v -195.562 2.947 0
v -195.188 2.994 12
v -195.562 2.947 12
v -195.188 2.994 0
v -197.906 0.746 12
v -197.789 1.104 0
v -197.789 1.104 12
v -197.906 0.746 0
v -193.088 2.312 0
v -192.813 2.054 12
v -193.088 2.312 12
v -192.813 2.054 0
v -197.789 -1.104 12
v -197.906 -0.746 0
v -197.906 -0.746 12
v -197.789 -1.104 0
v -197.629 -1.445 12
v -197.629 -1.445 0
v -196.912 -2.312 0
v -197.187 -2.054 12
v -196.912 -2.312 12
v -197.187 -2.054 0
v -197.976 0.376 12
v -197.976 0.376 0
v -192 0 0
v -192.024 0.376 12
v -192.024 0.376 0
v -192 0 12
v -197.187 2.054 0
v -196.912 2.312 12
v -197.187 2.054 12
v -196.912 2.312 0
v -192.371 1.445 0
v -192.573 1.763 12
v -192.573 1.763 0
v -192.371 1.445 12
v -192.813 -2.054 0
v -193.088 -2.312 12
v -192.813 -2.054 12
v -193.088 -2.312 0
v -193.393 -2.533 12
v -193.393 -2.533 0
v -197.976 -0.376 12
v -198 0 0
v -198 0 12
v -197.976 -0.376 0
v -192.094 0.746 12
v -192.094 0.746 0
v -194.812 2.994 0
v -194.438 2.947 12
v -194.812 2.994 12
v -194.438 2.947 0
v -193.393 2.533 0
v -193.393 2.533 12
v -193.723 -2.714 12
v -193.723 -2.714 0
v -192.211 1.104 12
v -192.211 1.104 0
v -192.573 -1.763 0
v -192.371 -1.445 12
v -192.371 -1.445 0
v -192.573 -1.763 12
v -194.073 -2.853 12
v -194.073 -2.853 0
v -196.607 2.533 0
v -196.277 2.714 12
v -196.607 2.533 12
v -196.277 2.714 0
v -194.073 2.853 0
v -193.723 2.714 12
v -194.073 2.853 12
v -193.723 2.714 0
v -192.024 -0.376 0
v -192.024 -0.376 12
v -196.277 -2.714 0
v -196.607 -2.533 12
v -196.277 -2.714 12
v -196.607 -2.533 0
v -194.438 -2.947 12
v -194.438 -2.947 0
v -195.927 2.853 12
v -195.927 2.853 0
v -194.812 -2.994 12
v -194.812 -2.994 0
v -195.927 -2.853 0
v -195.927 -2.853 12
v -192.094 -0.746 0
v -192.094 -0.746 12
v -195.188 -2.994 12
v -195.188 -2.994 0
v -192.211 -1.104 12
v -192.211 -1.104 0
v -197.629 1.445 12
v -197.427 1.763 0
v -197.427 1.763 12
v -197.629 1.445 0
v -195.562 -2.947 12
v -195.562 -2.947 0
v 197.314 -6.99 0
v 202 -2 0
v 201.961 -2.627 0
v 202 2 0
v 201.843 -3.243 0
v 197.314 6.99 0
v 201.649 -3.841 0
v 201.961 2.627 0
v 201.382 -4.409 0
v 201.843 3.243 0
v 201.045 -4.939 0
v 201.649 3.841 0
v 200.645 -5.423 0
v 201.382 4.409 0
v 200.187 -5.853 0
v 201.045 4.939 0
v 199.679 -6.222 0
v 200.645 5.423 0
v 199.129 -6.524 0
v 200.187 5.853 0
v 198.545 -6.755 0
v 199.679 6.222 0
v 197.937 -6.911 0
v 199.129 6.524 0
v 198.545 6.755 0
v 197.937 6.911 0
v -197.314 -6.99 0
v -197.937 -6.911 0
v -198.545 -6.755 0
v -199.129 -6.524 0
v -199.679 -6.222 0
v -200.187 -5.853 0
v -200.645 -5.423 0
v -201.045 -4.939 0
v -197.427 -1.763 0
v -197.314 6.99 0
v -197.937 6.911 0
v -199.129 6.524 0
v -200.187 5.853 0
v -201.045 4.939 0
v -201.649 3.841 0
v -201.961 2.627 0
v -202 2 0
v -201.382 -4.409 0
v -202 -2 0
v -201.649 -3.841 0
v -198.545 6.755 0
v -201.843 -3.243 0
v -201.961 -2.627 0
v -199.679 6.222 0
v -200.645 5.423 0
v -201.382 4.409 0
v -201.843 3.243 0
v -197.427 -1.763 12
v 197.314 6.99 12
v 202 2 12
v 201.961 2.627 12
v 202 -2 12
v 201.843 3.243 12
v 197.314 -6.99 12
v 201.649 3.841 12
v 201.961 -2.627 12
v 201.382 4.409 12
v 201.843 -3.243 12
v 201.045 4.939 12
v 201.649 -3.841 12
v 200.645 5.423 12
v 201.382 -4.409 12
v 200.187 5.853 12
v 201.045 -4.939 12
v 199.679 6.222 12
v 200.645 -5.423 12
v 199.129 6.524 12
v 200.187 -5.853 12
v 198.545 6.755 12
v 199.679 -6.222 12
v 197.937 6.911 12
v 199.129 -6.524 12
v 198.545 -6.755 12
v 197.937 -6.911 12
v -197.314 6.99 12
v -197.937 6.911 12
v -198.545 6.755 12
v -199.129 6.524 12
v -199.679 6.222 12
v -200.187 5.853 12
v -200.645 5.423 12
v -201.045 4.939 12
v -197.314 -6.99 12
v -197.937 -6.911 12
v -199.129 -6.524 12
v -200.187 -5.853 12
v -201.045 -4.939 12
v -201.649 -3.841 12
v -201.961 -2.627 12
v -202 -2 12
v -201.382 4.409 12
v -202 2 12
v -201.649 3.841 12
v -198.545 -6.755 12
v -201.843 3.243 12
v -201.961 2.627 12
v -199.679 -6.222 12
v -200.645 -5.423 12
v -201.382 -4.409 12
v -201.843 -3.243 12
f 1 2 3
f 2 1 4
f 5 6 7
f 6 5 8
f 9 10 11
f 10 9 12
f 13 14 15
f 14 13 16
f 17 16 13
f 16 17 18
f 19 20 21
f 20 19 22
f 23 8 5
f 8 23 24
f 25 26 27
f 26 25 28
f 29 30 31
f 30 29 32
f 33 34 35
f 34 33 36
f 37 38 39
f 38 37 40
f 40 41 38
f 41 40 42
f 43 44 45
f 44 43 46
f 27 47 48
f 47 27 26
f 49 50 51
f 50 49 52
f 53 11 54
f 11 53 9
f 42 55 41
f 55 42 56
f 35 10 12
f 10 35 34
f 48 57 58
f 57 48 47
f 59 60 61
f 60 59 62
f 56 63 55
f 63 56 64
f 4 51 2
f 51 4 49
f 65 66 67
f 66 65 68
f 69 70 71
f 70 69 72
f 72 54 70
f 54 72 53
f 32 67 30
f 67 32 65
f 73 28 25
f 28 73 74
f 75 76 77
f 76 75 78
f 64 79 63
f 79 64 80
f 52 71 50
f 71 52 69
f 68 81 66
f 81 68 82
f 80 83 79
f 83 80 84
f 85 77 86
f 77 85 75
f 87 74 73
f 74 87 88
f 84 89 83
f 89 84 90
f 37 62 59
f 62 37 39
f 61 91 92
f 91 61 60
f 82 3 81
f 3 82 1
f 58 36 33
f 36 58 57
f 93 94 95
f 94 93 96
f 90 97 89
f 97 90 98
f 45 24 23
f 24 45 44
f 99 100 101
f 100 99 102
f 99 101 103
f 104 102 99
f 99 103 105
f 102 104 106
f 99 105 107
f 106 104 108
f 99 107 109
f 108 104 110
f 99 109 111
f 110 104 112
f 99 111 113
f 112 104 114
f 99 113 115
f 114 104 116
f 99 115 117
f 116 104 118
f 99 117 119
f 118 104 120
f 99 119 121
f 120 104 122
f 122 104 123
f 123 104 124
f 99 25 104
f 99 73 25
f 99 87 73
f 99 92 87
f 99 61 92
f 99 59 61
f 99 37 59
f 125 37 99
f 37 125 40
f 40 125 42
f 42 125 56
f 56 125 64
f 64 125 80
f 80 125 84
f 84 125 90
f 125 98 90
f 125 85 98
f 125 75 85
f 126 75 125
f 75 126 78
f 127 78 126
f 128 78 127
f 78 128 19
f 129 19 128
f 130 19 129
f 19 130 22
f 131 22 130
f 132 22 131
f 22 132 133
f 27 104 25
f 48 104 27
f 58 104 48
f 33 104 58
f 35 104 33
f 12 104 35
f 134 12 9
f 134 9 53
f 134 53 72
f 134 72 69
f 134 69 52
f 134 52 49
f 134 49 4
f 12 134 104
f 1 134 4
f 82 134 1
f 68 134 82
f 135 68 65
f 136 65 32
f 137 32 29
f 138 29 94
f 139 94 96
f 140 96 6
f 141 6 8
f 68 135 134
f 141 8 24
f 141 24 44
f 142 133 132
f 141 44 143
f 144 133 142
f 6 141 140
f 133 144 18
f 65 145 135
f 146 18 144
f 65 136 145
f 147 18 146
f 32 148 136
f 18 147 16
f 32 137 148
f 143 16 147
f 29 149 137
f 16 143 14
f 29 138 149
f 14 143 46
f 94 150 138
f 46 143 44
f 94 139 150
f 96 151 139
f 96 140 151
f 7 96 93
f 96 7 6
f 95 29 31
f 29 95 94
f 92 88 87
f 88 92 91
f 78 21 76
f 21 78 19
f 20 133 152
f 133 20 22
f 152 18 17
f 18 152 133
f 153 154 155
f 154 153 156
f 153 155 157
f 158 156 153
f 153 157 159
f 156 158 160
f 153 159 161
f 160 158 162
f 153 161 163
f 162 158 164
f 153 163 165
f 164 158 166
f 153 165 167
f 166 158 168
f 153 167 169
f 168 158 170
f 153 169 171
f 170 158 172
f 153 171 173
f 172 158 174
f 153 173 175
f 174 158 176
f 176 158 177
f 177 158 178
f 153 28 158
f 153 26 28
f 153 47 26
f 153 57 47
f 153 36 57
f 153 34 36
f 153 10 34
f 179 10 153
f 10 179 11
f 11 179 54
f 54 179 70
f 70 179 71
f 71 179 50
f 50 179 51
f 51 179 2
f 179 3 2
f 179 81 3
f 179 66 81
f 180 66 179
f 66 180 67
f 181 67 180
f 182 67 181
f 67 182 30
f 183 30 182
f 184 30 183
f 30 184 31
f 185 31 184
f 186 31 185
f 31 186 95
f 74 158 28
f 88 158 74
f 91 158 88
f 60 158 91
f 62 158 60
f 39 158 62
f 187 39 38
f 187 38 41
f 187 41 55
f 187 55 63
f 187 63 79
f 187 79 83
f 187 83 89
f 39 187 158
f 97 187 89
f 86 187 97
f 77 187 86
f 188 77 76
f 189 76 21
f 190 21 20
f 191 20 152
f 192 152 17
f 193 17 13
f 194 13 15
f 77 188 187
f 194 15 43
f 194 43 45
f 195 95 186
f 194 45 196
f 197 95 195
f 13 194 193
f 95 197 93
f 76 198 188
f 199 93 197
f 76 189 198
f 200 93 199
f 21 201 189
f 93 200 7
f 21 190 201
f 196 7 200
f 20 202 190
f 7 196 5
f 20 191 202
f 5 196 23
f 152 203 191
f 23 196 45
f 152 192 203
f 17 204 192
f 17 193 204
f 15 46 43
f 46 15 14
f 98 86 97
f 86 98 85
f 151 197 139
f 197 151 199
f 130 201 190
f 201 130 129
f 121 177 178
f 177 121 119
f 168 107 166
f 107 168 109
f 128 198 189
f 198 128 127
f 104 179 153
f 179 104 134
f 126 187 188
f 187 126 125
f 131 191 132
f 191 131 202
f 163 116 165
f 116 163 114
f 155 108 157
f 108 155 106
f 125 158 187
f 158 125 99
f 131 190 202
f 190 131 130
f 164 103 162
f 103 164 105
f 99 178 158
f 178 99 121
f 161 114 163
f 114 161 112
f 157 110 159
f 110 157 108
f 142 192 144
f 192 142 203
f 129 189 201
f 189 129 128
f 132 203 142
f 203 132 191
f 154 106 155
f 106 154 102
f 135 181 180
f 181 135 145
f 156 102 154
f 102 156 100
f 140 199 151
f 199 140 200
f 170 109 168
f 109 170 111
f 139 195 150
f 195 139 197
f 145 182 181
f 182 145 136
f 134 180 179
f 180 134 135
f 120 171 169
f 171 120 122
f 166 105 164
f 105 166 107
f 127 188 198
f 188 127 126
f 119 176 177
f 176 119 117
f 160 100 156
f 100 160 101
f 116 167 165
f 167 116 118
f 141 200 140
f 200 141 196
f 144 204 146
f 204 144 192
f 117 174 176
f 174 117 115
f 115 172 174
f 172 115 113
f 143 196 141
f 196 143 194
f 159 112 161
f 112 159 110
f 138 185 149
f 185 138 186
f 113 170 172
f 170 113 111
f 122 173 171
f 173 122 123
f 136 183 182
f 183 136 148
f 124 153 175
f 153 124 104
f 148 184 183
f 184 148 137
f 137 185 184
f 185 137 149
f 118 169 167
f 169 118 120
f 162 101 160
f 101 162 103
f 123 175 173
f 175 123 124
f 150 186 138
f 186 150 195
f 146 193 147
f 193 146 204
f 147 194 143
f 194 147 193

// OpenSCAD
$fn = 50;


difference() {
	union() {
		hull() {
			translate(v = [-197.0000000000, 2.0000000000, 0]) {
				cylinder(h = 12, r = 5);
			}
			translate(v = [197.0000000000, 2.0000000000, 0]) {
				cylinder(h = 12, r = 5);
			}
			translate(v = [-197.0000000000, -2.0000000000, 0]) {
				cylinder(h = 12, r = 5);
			}
			translate(v = [197.0000000000, -2.0000000000, 0]) {
				cylinder(h = 12, r = 5);
			}
		}
	}
	union() {
		translate(v = [-195.0000000000, 0.0000000000, 0]) {
			cylinder(h = 12, r = 3.0000000000);
		}
		translate(v = [-195.0000000000, 0.0000000000, 0]) {
			cylinder(h = 12, r = 1.5000000000);
		}
		translate(v = [-195.0000000000, 0.0000000000, 0]) {
			cylinder(h = 12, r = 1.5000000000);
		}
		translate(v = [-195.0000000000, 0.0000000000, 0]) {
			cylinder(h = 12, r = 1.5000000000);
		}
	}
}
